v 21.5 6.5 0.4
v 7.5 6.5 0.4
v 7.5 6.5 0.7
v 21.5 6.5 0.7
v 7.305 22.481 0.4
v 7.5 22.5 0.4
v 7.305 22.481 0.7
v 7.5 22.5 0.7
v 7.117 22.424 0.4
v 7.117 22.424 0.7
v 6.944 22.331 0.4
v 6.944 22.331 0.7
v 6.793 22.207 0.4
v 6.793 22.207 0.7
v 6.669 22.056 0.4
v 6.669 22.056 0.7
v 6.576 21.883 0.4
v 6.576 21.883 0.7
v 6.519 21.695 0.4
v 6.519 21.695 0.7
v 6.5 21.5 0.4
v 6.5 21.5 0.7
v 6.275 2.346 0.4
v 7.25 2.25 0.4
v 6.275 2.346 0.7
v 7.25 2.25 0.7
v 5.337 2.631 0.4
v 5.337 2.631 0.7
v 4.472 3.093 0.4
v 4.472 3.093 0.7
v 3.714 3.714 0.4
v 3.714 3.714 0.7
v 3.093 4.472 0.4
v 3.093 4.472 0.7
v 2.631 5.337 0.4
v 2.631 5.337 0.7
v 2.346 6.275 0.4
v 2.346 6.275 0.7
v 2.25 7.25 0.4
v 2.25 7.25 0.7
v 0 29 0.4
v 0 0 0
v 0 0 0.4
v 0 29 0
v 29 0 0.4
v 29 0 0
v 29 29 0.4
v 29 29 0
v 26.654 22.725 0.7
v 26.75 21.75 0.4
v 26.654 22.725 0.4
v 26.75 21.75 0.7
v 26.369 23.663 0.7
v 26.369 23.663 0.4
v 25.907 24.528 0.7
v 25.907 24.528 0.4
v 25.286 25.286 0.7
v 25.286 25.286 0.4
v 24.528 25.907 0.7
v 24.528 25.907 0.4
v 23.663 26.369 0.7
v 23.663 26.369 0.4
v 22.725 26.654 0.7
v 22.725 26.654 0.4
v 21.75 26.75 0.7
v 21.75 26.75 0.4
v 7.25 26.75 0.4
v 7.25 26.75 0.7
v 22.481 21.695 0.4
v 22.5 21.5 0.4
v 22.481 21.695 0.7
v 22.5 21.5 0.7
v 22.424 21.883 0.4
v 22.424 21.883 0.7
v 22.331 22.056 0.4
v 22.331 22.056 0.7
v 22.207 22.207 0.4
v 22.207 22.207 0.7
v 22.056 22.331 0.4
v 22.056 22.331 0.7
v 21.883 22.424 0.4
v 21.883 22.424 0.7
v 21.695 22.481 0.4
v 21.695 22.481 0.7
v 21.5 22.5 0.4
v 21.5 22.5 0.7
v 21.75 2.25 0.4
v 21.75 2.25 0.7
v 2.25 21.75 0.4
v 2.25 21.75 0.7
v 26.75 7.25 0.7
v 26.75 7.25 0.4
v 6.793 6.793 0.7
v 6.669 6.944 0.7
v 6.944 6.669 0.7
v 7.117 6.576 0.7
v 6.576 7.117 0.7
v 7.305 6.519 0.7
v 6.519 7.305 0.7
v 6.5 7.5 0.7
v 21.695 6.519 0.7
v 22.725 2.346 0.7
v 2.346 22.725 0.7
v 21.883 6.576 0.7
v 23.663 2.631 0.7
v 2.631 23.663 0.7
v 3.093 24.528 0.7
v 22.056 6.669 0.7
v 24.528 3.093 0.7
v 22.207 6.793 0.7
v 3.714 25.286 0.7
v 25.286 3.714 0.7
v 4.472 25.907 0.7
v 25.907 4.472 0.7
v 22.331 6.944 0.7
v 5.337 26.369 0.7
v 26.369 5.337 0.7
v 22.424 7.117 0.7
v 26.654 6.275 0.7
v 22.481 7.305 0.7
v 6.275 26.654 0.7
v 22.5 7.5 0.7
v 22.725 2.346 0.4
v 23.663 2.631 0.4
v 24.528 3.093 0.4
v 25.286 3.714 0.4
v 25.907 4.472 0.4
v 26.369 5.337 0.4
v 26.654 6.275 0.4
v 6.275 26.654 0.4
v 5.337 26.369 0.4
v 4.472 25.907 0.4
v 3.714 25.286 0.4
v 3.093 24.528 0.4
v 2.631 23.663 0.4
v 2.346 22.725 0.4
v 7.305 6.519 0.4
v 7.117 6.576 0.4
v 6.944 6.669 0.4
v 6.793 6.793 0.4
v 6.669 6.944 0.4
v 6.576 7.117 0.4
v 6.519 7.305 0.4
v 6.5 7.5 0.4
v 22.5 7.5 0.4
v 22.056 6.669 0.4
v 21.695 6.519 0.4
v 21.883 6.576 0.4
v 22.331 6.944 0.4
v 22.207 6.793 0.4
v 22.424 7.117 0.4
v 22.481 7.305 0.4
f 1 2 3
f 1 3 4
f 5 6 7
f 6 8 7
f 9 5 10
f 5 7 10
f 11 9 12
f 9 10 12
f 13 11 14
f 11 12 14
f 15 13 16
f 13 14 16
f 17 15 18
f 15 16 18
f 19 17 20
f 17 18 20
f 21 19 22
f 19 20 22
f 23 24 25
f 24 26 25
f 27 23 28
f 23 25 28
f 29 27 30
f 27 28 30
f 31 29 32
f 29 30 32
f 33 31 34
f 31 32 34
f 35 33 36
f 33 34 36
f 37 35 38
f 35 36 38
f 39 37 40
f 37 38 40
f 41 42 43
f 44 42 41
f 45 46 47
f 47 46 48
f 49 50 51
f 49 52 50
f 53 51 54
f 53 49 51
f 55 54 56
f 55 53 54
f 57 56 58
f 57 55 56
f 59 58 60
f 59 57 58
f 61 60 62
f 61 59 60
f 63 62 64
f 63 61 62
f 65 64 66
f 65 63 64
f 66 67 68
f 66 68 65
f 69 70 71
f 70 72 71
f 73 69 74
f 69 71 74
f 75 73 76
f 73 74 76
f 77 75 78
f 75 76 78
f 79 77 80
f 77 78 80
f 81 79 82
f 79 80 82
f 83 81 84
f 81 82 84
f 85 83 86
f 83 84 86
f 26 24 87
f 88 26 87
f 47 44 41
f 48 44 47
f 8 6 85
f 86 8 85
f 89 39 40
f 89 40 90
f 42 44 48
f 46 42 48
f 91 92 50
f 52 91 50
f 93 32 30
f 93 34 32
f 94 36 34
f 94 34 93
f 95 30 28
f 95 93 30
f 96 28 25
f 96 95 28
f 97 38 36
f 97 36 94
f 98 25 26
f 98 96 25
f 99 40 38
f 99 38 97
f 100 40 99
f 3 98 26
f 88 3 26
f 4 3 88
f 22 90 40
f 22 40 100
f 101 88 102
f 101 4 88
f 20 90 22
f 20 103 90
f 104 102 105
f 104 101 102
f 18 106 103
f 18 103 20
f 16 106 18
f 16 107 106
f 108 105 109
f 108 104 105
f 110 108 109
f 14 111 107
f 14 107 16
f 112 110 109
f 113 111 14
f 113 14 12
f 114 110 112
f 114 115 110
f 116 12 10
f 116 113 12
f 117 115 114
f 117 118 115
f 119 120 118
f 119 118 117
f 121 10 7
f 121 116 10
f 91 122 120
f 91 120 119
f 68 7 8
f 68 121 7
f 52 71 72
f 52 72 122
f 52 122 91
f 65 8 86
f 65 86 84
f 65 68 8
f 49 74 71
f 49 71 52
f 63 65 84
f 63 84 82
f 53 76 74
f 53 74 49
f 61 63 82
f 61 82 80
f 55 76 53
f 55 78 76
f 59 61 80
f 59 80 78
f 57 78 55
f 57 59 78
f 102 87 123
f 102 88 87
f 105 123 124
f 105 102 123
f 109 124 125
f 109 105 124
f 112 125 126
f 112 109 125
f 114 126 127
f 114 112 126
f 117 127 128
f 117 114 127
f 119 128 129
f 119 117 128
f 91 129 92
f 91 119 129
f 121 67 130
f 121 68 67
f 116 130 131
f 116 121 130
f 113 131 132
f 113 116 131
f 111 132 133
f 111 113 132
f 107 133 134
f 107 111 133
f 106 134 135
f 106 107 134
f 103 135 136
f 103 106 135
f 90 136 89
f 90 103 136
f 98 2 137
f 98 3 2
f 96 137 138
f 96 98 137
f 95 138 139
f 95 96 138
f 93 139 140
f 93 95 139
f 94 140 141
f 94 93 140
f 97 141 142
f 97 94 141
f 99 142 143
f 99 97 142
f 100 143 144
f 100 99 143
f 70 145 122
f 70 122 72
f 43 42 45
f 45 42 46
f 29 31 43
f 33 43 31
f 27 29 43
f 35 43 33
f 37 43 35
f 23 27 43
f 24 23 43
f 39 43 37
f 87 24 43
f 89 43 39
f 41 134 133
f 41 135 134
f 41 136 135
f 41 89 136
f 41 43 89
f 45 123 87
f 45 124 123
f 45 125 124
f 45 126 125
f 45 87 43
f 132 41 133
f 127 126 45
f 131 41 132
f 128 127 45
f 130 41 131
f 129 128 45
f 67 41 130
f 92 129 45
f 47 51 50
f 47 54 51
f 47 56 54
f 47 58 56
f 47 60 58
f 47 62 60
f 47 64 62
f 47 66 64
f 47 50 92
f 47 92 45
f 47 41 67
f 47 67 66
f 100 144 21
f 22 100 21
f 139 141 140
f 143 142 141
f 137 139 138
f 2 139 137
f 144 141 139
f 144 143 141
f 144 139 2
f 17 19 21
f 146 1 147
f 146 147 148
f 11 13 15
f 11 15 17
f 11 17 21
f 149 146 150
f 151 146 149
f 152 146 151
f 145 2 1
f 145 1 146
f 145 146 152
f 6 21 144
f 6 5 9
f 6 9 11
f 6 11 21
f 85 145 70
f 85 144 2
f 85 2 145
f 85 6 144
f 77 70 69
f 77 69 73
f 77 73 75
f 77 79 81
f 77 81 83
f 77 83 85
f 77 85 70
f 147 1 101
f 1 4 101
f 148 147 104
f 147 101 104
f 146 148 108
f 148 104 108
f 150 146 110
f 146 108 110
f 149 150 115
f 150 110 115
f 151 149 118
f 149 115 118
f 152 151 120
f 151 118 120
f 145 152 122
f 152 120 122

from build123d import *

# Parameters (mm, degrees)
SKETCH1_W           = 29
SKETCH1_H           = 29
BOSS_EXTRUDE1_DEPTH = 0.4
SKETCH2_W           = 24.5
SKETCH2_H           = 24.5
SKETCH2_W_2         = 16
SKETCH2_H_2         = 16
BOSS_EXTRUDE2_DEPTH = 0.3
FILLET1_R           = 5
FILLET2_R           = 1


with BuildPart() as part:
    # Sketch1 → Boss-Extrude1 (new body)
    with BuildSketch(Plane.XY):
        with Locations((14.5, 14.5)):
            Rectangle(SKETCH1_W, SKETCH1_H)
    extrude(amount=BOSS_EXTRUDE1_DEPTH)

    # Sketch2 → Boss-Extrude2 (add)
    with BuildSketch(Plane.XY.offset(0.4)):
        with Locations((14.5, 14.5)):
            Rectangle(SKETCH2_W, SKETCH2_H)
        with Locations((14.5, 14.5)):
            Rectangle(SKETCH2_W_2, SKETCH2_H_2, mode=Mode.SUBTRACT)
    extrude(amount=BOSS_EXTRUDE2_DEPTH)

    # Fillet1
    fillet1_edges = [part.edges().sort_by_distance(p)[0] for p in [
        (2.25, 26.75, 0.55),
        (2.25, 2.25, 0.55),
        (26.75, 2.25, 0.55),
        (26.75, 26.75, 0.55),
    ]]
    fillet(fillet1_edges, radius=FILLET1_R)

    # Fillet2
    fillet2_edges = [part.edges().sort_by_distance(p)[0] for p in [
        (6.5, 6.5, 0.55),
        (22.5, 6.5, 0.55),
        (22.5, 22.5, 0.55),
        (6.5, 22.5, 0.55),
    ]]
    fillet(fillet2_edges, radius=FILLET2_R)


solid = part.part
